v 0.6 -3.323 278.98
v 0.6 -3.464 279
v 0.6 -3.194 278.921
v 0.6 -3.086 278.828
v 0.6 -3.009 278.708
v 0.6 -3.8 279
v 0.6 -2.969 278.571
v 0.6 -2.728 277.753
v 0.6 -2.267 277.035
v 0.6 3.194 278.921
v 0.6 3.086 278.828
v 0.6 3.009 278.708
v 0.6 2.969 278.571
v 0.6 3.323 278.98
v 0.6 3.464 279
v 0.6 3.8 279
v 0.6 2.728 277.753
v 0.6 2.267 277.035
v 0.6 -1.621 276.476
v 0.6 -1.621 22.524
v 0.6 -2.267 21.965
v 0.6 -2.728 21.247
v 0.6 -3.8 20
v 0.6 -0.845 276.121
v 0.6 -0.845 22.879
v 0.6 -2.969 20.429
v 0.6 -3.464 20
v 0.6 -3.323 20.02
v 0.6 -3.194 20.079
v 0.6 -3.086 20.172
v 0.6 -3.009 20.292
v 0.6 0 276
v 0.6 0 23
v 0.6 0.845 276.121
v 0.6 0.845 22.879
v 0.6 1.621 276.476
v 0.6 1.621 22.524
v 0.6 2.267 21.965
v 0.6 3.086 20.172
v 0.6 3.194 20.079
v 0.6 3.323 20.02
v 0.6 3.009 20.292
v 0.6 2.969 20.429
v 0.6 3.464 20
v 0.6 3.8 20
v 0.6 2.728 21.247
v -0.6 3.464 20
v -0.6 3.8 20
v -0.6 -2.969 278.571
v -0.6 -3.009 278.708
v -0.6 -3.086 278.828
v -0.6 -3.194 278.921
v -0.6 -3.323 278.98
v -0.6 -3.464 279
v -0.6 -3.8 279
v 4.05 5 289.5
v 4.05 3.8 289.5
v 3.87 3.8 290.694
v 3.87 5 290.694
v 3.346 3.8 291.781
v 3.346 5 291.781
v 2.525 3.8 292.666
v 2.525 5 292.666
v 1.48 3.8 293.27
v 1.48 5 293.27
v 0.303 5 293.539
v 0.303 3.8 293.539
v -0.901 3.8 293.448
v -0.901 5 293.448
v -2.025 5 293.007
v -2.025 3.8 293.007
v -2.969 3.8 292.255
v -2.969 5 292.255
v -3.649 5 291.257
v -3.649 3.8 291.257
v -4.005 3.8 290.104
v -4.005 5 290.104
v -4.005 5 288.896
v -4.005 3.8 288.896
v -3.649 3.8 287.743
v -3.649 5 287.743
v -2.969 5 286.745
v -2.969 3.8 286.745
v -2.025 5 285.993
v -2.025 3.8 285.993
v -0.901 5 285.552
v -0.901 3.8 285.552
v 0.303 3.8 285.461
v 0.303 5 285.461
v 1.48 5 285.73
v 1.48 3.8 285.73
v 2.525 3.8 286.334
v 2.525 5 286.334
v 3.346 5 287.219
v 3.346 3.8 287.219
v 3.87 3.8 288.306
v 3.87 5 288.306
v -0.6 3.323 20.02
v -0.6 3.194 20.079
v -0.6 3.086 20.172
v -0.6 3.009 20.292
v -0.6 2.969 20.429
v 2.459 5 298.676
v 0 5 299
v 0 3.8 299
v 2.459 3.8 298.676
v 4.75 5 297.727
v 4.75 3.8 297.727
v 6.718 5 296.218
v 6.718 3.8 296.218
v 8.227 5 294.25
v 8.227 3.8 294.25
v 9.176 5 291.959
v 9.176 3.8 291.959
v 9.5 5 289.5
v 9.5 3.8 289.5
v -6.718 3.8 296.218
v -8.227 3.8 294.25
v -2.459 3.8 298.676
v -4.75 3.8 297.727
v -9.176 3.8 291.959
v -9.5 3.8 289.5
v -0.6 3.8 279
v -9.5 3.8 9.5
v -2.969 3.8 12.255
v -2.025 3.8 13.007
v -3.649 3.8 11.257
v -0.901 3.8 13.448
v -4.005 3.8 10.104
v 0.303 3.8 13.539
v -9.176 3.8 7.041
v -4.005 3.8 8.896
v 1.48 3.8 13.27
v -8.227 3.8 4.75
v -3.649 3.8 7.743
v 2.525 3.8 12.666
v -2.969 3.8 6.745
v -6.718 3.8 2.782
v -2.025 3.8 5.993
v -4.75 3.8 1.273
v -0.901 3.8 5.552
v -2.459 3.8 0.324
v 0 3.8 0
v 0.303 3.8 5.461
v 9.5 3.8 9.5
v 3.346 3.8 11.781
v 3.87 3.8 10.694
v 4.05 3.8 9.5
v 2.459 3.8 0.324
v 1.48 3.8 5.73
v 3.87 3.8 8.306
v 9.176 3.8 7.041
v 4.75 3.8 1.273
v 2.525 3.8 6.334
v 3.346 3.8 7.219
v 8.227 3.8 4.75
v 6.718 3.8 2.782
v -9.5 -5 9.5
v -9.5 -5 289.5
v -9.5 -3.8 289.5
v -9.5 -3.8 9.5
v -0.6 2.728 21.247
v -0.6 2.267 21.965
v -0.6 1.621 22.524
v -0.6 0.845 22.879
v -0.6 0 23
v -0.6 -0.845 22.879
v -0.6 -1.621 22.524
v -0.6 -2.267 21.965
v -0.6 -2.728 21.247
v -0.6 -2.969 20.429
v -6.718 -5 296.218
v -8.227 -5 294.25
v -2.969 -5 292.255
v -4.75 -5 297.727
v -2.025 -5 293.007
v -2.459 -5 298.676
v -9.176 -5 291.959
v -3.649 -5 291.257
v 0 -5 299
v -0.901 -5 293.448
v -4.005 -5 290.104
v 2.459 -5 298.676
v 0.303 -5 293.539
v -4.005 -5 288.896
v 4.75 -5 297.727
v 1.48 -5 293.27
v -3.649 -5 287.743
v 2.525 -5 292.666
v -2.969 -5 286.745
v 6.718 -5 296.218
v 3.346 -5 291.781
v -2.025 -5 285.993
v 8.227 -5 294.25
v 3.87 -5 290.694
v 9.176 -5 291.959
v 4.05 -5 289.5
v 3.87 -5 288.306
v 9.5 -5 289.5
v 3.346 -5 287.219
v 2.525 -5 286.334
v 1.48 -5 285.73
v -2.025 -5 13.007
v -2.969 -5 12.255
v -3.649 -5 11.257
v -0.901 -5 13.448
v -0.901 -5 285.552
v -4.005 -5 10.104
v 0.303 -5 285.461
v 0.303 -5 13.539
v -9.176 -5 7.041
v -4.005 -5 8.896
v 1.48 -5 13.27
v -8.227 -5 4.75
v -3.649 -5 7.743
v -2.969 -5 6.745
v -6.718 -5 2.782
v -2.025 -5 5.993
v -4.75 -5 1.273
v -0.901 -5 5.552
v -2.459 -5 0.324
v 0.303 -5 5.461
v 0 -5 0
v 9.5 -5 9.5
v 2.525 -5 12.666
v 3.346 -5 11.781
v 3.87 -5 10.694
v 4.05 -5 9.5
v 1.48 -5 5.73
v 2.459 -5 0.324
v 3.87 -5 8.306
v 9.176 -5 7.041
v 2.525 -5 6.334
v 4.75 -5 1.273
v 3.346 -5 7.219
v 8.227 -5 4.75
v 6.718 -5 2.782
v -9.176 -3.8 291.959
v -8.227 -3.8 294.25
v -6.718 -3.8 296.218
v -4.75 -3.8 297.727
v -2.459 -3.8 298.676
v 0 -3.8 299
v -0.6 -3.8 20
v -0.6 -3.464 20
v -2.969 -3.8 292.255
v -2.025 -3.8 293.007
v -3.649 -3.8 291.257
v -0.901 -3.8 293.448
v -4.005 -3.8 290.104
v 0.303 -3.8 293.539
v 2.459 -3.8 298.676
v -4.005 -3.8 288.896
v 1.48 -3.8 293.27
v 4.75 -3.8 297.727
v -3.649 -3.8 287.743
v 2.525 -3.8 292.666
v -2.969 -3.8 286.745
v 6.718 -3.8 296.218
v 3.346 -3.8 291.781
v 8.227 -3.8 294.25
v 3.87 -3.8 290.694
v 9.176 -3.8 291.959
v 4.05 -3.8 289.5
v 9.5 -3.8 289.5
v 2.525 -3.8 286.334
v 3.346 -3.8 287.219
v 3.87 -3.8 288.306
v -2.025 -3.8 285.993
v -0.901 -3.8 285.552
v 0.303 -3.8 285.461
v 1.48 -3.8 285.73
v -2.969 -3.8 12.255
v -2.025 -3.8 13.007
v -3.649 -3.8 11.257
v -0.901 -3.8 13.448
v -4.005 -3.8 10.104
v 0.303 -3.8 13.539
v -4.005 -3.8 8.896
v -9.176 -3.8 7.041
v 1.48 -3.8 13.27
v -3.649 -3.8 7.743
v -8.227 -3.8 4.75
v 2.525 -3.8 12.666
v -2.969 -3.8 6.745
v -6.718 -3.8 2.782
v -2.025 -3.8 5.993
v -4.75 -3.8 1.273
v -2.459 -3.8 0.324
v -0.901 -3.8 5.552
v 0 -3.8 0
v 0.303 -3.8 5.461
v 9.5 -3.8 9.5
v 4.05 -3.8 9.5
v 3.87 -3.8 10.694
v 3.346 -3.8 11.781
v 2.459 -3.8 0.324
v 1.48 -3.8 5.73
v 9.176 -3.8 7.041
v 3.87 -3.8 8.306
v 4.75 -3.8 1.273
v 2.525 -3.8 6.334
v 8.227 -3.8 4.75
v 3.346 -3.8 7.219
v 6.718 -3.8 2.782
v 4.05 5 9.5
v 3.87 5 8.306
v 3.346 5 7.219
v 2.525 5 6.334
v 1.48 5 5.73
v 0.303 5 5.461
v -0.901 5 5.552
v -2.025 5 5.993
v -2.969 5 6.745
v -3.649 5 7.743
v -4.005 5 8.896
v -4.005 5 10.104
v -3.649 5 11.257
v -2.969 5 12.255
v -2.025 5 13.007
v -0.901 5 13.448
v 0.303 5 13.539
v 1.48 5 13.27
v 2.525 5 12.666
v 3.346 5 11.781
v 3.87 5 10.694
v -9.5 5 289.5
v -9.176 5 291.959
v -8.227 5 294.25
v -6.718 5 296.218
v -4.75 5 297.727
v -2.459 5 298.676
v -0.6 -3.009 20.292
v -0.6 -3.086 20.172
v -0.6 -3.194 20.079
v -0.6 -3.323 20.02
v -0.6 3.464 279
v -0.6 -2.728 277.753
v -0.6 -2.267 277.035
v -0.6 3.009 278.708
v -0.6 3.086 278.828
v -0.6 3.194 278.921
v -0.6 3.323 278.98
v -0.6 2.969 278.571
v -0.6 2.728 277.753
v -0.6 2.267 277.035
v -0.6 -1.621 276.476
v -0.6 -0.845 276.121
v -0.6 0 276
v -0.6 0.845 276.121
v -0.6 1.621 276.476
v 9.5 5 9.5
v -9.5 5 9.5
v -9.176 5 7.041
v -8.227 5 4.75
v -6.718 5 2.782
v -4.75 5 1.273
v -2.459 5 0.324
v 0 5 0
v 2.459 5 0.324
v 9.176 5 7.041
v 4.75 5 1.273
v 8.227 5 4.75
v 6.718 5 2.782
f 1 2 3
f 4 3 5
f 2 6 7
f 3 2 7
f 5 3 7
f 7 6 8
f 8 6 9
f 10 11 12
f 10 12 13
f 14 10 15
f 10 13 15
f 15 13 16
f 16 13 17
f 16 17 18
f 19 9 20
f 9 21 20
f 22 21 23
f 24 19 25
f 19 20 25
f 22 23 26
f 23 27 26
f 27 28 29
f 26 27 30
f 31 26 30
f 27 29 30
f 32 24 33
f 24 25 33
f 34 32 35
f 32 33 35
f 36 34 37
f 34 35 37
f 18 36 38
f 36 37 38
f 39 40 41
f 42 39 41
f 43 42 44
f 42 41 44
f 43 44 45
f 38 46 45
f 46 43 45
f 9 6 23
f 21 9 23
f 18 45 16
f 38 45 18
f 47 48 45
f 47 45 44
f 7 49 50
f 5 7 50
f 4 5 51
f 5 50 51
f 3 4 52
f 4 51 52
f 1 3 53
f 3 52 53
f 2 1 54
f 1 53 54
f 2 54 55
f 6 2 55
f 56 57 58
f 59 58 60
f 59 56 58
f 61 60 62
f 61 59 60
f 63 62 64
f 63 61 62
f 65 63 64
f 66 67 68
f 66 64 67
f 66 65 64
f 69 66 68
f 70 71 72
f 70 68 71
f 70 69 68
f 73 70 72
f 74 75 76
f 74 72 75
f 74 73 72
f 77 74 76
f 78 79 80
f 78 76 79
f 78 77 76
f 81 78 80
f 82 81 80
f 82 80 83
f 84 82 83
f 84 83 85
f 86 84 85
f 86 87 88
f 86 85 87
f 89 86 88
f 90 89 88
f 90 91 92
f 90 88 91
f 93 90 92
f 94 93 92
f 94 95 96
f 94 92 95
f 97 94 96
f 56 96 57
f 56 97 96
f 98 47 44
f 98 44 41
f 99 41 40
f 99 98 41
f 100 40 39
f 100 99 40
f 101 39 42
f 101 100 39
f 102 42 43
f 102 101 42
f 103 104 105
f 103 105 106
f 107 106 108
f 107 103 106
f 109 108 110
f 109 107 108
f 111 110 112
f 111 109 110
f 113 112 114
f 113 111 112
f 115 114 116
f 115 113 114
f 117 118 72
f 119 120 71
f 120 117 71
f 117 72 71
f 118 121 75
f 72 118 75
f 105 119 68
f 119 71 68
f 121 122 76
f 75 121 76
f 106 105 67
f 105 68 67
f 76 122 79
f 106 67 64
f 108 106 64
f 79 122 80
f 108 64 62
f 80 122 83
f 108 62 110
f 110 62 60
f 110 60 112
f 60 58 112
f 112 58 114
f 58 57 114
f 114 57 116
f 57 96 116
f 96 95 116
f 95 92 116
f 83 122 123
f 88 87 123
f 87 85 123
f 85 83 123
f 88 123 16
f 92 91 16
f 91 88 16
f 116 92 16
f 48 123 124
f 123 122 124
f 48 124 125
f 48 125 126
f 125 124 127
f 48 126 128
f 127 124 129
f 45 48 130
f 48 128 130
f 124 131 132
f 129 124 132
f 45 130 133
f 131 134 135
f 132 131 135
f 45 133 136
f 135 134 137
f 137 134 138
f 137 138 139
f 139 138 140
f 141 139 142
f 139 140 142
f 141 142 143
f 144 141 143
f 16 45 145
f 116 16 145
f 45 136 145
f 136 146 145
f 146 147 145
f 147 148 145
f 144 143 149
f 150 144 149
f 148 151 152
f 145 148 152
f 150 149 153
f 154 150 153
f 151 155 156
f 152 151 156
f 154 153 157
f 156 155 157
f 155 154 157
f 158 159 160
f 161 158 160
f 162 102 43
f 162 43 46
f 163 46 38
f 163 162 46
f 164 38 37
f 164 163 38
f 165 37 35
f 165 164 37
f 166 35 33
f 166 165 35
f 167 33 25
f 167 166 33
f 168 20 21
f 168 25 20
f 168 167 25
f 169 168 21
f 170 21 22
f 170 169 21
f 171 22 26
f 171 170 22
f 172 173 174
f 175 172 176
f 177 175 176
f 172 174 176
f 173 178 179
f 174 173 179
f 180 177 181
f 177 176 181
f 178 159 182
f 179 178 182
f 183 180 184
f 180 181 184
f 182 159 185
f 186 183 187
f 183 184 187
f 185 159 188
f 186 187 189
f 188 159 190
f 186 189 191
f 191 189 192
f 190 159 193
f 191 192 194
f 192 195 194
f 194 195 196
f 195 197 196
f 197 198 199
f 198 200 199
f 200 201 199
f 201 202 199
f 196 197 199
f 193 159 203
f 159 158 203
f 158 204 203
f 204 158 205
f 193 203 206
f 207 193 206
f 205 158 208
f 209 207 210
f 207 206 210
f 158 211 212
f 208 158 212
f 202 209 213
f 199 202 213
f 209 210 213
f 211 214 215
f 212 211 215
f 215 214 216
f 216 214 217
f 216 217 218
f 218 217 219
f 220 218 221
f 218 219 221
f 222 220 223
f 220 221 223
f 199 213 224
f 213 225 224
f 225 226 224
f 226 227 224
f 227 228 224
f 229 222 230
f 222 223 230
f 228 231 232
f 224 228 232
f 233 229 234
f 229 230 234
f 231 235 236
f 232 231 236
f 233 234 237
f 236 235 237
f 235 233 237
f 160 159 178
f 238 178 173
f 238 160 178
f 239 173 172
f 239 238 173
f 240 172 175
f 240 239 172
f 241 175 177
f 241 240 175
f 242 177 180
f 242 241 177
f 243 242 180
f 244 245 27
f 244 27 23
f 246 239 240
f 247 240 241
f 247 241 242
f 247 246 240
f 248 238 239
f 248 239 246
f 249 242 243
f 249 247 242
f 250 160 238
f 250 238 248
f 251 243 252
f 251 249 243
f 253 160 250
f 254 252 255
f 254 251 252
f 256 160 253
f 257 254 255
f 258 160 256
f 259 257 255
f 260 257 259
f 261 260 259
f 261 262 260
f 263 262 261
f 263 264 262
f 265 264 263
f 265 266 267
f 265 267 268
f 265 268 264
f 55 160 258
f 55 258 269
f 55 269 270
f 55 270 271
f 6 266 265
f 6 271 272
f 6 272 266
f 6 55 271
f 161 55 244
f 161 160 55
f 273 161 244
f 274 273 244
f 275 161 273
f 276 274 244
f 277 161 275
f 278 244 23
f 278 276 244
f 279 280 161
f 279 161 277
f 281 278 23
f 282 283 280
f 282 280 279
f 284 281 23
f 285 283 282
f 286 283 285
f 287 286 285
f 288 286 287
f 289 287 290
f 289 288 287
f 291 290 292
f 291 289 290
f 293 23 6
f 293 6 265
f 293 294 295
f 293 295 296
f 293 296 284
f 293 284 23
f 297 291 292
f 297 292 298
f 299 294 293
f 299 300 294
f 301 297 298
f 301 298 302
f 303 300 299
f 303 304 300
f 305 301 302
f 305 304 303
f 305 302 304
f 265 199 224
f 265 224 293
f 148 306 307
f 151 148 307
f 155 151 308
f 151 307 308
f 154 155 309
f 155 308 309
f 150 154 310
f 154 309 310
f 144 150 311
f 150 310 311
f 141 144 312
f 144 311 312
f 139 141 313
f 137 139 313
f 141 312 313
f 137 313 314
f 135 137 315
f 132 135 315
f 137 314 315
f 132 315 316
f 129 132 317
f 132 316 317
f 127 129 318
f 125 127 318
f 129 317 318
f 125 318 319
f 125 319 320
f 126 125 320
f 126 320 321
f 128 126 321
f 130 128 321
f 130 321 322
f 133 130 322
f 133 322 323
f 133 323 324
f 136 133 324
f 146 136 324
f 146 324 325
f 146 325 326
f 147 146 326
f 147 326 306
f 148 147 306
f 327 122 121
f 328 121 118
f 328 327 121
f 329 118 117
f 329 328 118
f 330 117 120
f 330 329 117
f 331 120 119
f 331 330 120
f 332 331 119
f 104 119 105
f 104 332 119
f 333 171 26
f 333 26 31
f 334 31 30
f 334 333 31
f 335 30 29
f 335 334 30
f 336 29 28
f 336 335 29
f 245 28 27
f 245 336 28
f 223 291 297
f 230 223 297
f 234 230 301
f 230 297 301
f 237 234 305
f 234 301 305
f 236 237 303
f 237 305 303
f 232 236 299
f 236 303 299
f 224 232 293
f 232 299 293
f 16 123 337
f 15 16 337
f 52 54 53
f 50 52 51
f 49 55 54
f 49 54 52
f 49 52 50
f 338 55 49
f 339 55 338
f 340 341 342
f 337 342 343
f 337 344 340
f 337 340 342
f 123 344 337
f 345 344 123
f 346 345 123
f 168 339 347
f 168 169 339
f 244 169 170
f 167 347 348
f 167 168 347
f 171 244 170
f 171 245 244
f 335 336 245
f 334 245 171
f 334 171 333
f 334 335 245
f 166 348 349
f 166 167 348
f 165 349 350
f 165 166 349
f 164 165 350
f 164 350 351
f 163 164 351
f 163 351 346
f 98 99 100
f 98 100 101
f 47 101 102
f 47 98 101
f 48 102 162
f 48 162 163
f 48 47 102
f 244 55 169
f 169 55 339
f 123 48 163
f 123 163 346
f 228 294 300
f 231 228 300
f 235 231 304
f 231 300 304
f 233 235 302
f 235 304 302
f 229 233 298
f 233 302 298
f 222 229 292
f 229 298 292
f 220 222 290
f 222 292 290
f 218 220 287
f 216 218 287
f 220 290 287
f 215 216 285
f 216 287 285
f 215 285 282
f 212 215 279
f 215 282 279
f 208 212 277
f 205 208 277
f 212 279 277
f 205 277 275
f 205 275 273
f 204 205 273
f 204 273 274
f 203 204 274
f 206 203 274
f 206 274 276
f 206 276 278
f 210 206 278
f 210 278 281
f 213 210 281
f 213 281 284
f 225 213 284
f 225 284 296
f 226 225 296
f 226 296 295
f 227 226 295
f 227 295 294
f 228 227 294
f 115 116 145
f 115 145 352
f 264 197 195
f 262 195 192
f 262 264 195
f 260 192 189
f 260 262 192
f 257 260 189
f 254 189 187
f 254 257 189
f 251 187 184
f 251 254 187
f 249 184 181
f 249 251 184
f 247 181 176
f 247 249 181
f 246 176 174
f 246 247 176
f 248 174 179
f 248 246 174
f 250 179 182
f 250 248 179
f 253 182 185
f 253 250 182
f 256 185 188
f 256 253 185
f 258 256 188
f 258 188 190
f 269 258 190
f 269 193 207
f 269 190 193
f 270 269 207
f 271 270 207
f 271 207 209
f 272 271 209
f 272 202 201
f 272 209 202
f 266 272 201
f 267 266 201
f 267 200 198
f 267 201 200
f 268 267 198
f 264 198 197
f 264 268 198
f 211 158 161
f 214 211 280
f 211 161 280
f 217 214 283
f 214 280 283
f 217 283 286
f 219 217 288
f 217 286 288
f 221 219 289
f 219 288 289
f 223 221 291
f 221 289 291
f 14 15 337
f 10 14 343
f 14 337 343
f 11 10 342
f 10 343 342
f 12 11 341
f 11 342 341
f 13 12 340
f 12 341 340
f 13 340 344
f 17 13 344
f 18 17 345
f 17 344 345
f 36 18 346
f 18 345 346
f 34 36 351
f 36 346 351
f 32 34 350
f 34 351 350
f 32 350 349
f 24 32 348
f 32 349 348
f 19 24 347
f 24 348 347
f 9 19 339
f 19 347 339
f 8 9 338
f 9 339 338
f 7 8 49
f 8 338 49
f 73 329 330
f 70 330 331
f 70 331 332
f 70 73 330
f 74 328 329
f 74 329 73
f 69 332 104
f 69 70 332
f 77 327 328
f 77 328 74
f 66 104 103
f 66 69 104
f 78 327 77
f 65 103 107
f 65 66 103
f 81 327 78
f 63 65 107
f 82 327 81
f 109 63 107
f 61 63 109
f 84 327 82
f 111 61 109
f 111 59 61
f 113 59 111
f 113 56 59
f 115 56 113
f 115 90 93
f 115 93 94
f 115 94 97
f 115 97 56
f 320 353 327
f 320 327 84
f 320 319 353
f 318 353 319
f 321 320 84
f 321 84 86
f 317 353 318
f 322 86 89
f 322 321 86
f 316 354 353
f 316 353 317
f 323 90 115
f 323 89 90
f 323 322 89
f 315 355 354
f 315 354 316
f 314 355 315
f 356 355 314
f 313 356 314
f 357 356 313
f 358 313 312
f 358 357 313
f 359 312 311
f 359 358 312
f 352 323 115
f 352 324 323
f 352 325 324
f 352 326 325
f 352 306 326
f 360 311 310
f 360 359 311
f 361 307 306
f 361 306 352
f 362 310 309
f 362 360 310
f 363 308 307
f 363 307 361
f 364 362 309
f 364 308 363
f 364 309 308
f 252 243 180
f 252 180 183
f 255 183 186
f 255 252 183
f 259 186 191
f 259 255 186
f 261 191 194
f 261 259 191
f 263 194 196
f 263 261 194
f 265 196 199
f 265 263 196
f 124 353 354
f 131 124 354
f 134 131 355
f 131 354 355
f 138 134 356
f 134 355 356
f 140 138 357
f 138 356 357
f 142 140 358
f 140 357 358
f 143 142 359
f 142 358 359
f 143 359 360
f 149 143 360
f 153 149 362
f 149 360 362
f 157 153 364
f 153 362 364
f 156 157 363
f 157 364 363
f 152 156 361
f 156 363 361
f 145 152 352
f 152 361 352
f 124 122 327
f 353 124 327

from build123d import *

# Parameters (mm, degrees)
SKETCH1_W           = 1.2
SKETCH1_H           = 7.6
SKETCH1_W_2         = 19
SKETCH1_H_2         = 1.2
BOSS_EXTRUDE1_DEPTH = 299
SKETCH3_R           = 4.05
CUT_EXTRUDE2_DEPTH  = 370
CUT_EXTRUDE4_DEPTH  = 370


with BuildPart() as part:
    # Sketch1 → Boss-Extrude1 (new body)
    with BuildSketch(Plane.XY):
        Rectangle(SKETCH1_W, SKETCH1_H)
        with Locations((0, -4.4)):
            Rectangle(SKETCH1_W_2, SKETCH1_H_2)
        with Locations((0, 4.4)):
            Rectangle(SKETCH1_W_2, SKETCH1_H_2)
    extrude(amount=BOSS_EXTRUDE1_DEPTH)

    # Sketch3 → Cut-Extrude2 (cut)
    with BuildSketch(Plane(origin=(0, 5, 0), x_dir=(1, 0, 0), z_dir=(0, 1, 0))):
        with BuildLine():
            Line((-9.5, 0), (-9.5, -9.5))
            ThreePointArc((-9.5, -9.5), (-6.717514436, -2.782485594), (-4.2e-08, 0))
            Line((-4.2e-08, 0), (-9.5, 0))
        make_face()
        with BuildLine():
            Line((9.5, 0), (-4.2e-08, 0))
            ThreePointArc((-4.2e-08, 0), (6.717514406, -2.782485564), (9.5, -9.5))
            Line((9.5, -9.5), (9.5, 0))
        make_face()
        with BuildLine():
            ThreePointArc((14.5, -9.5), (0, 5), (-14.5, -9.5))
            Line((-14.5, -9.5), (-9.5, -9.5))
            Line((-9.5, -9.5), (-9.5, 0))
            Line((-9.5, 0), (-4.2e-08, 0))
            Line((-4.2e-08, 0), (9.5, 0))
            Line((9.5, 0), (9.5, -9.5))
            Line((9.5, -9.5), (14.5, -9.5))
        make_face()
        with Locations((0, -9.5)):
            Circle(SKETCH3_R)
    cut_extrude2 = extrude(amount=-CUT_EXTRUDE2_DEPTH, mode=Mode.SUBTRACT)

    # Mirror1: Cut-Extrude2 across plane
    add(cut_extrude2.mirror(Plane.XY.offset(149.5)), mode=Mode.SUBTRACT)

    # Sketch6 → Cut-Extrude4 (cut)
    with BuildSketch(Plane.ZY.offset(0.6)):
        with BuildLine():
            Line((20, -3.8), (-1, -3.8))
            Line((-1, -3.8), (-1, 3.8))
            Line((-1, 3.8), (20, 3.8))
            Line((20, 3.8), (20, 3.464101615))
            ThreePointArc((20, 3.464101615), (20.122035527, 3.13677478), (20.428571429, 2.969229956))
            ThreePointArc((20.428571429, 2.969229956), (23, 0), (20.428571429, -2.969229956))
            ThreePointArc((20.428571429, -2.969229956), (20.122035527, -3.13677478), (20, -3.464101615))
            Line((20, -3.464101615), (20, -3.8))
        make_face()
    cut_extrude4 = extrude(amount=-CUT_EXTRUDE4_DEPTH, mode=Mode.SUBTRACT)

    # Mirror3: Cut-Extrude4 across plane
    add(cut_extrude4.mirror(Plane.XY.offset(149.5)), mode=Mode.SUBTRACT)


solid = part.part
